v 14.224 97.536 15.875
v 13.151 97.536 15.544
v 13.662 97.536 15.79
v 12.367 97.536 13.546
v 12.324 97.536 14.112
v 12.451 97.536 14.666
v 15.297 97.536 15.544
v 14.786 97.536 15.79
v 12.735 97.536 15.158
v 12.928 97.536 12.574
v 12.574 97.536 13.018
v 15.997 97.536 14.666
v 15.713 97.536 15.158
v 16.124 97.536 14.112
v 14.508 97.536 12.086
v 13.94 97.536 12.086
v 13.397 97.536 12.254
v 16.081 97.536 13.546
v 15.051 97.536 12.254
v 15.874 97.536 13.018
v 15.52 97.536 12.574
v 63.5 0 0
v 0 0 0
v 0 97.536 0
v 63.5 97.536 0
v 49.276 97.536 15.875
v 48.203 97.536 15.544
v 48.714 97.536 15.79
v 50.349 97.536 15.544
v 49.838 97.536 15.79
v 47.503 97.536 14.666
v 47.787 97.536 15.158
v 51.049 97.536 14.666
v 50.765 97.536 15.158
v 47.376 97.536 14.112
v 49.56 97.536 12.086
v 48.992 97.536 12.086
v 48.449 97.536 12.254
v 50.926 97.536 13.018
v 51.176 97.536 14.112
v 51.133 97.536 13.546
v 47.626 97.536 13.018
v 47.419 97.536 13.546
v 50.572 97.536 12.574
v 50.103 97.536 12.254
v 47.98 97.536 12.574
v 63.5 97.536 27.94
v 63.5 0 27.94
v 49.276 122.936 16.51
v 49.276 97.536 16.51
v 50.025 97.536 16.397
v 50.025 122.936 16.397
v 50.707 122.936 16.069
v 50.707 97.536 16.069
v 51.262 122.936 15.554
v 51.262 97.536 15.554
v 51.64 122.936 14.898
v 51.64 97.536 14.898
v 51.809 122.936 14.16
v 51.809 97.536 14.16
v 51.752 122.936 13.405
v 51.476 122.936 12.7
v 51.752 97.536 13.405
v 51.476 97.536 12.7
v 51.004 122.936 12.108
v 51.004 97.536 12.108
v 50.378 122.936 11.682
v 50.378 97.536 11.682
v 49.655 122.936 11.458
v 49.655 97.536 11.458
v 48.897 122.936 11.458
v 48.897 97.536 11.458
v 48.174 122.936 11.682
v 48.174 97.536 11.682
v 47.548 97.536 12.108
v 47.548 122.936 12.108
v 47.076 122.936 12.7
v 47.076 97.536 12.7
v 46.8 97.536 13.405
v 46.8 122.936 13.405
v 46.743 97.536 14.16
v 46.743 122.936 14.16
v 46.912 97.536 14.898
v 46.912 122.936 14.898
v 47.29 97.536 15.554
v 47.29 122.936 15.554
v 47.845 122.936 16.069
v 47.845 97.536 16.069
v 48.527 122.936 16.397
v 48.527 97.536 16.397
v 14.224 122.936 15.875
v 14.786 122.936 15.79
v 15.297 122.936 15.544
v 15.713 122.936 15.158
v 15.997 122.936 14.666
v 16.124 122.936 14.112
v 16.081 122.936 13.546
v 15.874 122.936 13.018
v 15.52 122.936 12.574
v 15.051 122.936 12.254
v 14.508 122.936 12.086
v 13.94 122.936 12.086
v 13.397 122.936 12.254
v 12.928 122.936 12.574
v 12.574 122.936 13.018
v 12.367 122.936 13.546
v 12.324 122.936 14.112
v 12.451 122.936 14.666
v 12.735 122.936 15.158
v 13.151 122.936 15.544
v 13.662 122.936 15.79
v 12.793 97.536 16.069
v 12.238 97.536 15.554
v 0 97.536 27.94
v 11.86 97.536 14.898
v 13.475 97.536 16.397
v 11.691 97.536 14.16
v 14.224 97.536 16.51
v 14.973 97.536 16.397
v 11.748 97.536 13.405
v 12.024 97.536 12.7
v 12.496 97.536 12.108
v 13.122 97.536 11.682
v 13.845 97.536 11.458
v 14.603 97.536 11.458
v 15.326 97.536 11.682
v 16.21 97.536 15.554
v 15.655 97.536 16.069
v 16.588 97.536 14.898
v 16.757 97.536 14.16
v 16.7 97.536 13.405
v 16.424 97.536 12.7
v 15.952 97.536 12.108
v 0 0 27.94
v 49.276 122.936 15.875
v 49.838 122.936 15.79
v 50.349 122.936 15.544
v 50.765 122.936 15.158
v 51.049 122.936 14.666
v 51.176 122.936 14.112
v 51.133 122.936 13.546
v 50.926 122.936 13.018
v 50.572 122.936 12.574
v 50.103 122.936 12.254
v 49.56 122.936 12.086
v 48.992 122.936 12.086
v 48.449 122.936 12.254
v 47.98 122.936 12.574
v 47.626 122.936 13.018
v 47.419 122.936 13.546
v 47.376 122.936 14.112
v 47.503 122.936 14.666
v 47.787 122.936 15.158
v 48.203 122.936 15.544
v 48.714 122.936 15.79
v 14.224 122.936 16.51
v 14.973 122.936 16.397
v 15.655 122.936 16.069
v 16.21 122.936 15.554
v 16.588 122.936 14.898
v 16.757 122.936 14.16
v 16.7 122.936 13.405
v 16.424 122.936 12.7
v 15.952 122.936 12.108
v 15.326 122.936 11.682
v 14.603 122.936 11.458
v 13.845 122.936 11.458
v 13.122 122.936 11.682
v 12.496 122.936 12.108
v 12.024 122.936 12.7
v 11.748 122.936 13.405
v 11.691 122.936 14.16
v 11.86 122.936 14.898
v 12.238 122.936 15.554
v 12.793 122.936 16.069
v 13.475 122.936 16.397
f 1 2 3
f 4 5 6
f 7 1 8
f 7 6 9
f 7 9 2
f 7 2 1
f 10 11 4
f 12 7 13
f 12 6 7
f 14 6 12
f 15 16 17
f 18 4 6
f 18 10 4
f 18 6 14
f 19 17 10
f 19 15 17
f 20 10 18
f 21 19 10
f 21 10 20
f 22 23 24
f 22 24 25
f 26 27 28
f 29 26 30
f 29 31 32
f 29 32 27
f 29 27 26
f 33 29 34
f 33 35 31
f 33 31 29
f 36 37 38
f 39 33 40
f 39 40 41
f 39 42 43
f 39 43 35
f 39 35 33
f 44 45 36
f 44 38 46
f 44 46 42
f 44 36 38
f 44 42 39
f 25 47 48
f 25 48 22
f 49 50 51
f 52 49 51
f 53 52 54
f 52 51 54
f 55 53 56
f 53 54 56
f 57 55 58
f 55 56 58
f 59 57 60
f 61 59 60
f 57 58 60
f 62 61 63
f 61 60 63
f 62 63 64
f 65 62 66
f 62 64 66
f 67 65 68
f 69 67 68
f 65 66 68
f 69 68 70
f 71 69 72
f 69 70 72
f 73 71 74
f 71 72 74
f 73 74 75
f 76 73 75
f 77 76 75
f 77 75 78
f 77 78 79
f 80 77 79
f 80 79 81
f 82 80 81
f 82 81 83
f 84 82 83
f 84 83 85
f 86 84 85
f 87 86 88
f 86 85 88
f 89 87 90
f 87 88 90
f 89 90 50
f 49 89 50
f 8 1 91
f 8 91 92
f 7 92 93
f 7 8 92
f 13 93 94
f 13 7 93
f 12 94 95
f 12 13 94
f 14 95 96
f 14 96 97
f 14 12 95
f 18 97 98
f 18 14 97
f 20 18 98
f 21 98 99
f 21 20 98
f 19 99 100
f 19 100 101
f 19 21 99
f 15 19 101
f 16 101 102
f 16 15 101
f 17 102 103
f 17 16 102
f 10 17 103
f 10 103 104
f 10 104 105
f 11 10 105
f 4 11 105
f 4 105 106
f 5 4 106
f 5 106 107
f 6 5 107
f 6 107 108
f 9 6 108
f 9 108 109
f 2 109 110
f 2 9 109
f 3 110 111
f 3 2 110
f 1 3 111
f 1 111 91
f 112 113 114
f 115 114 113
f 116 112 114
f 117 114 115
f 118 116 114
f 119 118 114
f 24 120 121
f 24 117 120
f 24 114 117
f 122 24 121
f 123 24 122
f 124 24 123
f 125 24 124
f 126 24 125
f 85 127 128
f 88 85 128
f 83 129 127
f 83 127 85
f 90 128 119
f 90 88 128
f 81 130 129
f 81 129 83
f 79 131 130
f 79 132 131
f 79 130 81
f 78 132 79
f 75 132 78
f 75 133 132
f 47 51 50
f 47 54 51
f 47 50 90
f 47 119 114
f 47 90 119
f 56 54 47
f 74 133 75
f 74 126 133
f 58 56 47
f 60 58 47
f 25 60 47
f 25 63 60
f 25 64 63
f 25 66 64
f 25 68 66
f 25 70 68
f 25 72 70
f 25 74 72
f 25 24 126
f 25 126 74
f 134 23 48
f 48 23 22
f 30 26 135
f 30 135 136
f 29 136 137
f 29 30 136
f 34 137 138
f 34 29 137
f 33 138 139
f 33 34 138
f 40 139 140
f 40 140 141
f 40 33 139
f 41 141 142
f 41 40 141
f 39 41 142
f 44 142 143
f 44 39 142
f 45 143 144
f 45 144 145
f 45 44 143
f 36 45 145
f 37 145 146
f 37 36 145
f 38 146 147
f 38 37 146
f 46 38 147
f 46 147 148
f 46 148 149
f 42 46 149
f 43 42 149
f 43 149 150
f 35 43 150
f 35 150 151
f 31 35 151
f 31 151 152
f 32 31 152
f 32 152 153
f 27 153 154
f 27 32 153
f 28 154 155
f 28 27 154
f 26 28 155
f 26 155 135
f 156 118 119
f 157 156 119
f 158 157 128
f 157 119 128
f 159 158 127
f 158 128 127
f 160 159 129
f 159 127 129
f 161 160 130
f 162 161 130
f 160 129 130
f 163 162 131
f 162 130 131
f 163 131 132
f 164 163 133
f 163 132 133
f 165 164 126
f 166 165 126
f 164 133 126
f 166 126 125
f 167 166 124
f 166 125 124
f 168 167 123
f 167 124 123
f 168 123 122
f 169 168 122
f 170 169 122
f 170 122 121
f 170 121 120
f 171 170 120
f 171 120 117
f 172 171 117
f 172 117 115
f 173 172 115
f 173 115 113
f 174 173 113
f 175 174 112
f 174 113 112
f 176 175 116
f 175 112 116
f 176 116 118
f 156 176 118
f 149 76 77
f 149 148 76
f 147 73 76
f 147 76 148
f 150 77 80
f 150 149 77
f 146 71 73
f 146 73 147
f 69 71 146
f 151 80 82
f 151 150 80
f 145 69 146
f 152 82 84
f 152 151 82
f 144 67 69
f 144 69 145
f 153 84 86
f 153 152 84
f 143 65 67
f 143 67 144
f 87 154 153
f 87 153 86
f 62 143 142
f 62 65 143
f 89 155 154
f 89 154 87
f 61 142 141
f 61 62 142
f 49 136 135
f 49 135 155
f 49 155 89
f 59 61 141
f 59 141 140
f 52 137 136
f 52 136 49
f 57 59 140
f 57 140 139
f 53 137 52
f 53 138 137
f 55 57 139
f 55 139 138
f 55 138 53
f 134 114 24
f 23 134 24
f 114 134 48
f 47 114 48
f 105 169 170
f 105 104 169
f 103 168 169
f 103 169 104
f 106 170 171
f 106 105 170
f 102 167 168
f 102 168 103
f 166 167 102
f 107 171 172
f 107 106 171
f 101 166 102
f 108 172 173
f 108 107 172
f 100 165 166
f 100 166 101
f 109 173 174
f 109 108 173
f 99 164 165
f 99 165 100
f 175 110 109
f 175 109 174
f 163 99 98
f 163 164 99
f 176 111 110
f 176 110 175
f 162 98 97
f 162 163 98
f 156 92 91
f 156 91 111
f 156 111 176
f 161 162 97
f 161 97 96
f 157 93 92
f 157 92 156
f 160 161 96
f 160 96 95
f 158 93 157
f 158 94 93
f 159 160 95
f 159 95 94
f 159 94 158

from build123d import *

# Parameters (mm, degrees)
SKETCH1_W           = 63.5
SKETCH1_H           = 27.94
BOSS_EXTRUDE1_DEPTH = 97.536
SKETCH2_R           = 2.54
SKETCH2_R_2         = 1.905
BOSS_EXTRUDE2_DEPTH = 25.4


with BuildPart() as part:
    # Sketch1 → Boss-Extrude1 (new body)
    with BuildSketch(Plane(origin=(0, 0, 0), x_dir=(1, 0, 0), z_dir=(0, 1, 0))):
        with Locations((31.75, -13.97)):
            Rectangle(SKETCH1_W, SKETCH1_H)
    extrude(amount=BOSS_EXTRUDE1_DEPTH)

    # Sketch2 → Boss-Extrude2 (add)
    # profile 1 of 2: a face of its own
    with BuildSketch(Plane(origin=(0, 97.536, 0), x_dir=(1, 0, 0), z_dir=(0, 1, 0))):
        with Locations(Location((14.224, -13.97, 0), (0, 0, 270))):
            Circle(SKETCH2_R)
        with Locations(Location((14.224, -13.97, 0), (0, 0, 270))):
            Circle(SKETCH2_R_2, mode=Mode.SUBTRACT)
    # profile 2 of 2: a face of its own
    with BuildSketch(Plane(origin=(0, 97.536, 0), x_dir=(1, 0, 0), z_dir=(0, 1, 0))):
        with Locations(Location((49.276, -13.97, 0), (0, 0, 270))):
            Circle(SKETCH2_R)
        with Locations(Location((49.276, -13.97, 0), (0, 0, 270))):
            Circle(SKETCH2_R_2, mode=Mode.SUBTRACT)
    extrude(amount=BOSS_EXTRUDE2_DEPTH)


solid = part.part
